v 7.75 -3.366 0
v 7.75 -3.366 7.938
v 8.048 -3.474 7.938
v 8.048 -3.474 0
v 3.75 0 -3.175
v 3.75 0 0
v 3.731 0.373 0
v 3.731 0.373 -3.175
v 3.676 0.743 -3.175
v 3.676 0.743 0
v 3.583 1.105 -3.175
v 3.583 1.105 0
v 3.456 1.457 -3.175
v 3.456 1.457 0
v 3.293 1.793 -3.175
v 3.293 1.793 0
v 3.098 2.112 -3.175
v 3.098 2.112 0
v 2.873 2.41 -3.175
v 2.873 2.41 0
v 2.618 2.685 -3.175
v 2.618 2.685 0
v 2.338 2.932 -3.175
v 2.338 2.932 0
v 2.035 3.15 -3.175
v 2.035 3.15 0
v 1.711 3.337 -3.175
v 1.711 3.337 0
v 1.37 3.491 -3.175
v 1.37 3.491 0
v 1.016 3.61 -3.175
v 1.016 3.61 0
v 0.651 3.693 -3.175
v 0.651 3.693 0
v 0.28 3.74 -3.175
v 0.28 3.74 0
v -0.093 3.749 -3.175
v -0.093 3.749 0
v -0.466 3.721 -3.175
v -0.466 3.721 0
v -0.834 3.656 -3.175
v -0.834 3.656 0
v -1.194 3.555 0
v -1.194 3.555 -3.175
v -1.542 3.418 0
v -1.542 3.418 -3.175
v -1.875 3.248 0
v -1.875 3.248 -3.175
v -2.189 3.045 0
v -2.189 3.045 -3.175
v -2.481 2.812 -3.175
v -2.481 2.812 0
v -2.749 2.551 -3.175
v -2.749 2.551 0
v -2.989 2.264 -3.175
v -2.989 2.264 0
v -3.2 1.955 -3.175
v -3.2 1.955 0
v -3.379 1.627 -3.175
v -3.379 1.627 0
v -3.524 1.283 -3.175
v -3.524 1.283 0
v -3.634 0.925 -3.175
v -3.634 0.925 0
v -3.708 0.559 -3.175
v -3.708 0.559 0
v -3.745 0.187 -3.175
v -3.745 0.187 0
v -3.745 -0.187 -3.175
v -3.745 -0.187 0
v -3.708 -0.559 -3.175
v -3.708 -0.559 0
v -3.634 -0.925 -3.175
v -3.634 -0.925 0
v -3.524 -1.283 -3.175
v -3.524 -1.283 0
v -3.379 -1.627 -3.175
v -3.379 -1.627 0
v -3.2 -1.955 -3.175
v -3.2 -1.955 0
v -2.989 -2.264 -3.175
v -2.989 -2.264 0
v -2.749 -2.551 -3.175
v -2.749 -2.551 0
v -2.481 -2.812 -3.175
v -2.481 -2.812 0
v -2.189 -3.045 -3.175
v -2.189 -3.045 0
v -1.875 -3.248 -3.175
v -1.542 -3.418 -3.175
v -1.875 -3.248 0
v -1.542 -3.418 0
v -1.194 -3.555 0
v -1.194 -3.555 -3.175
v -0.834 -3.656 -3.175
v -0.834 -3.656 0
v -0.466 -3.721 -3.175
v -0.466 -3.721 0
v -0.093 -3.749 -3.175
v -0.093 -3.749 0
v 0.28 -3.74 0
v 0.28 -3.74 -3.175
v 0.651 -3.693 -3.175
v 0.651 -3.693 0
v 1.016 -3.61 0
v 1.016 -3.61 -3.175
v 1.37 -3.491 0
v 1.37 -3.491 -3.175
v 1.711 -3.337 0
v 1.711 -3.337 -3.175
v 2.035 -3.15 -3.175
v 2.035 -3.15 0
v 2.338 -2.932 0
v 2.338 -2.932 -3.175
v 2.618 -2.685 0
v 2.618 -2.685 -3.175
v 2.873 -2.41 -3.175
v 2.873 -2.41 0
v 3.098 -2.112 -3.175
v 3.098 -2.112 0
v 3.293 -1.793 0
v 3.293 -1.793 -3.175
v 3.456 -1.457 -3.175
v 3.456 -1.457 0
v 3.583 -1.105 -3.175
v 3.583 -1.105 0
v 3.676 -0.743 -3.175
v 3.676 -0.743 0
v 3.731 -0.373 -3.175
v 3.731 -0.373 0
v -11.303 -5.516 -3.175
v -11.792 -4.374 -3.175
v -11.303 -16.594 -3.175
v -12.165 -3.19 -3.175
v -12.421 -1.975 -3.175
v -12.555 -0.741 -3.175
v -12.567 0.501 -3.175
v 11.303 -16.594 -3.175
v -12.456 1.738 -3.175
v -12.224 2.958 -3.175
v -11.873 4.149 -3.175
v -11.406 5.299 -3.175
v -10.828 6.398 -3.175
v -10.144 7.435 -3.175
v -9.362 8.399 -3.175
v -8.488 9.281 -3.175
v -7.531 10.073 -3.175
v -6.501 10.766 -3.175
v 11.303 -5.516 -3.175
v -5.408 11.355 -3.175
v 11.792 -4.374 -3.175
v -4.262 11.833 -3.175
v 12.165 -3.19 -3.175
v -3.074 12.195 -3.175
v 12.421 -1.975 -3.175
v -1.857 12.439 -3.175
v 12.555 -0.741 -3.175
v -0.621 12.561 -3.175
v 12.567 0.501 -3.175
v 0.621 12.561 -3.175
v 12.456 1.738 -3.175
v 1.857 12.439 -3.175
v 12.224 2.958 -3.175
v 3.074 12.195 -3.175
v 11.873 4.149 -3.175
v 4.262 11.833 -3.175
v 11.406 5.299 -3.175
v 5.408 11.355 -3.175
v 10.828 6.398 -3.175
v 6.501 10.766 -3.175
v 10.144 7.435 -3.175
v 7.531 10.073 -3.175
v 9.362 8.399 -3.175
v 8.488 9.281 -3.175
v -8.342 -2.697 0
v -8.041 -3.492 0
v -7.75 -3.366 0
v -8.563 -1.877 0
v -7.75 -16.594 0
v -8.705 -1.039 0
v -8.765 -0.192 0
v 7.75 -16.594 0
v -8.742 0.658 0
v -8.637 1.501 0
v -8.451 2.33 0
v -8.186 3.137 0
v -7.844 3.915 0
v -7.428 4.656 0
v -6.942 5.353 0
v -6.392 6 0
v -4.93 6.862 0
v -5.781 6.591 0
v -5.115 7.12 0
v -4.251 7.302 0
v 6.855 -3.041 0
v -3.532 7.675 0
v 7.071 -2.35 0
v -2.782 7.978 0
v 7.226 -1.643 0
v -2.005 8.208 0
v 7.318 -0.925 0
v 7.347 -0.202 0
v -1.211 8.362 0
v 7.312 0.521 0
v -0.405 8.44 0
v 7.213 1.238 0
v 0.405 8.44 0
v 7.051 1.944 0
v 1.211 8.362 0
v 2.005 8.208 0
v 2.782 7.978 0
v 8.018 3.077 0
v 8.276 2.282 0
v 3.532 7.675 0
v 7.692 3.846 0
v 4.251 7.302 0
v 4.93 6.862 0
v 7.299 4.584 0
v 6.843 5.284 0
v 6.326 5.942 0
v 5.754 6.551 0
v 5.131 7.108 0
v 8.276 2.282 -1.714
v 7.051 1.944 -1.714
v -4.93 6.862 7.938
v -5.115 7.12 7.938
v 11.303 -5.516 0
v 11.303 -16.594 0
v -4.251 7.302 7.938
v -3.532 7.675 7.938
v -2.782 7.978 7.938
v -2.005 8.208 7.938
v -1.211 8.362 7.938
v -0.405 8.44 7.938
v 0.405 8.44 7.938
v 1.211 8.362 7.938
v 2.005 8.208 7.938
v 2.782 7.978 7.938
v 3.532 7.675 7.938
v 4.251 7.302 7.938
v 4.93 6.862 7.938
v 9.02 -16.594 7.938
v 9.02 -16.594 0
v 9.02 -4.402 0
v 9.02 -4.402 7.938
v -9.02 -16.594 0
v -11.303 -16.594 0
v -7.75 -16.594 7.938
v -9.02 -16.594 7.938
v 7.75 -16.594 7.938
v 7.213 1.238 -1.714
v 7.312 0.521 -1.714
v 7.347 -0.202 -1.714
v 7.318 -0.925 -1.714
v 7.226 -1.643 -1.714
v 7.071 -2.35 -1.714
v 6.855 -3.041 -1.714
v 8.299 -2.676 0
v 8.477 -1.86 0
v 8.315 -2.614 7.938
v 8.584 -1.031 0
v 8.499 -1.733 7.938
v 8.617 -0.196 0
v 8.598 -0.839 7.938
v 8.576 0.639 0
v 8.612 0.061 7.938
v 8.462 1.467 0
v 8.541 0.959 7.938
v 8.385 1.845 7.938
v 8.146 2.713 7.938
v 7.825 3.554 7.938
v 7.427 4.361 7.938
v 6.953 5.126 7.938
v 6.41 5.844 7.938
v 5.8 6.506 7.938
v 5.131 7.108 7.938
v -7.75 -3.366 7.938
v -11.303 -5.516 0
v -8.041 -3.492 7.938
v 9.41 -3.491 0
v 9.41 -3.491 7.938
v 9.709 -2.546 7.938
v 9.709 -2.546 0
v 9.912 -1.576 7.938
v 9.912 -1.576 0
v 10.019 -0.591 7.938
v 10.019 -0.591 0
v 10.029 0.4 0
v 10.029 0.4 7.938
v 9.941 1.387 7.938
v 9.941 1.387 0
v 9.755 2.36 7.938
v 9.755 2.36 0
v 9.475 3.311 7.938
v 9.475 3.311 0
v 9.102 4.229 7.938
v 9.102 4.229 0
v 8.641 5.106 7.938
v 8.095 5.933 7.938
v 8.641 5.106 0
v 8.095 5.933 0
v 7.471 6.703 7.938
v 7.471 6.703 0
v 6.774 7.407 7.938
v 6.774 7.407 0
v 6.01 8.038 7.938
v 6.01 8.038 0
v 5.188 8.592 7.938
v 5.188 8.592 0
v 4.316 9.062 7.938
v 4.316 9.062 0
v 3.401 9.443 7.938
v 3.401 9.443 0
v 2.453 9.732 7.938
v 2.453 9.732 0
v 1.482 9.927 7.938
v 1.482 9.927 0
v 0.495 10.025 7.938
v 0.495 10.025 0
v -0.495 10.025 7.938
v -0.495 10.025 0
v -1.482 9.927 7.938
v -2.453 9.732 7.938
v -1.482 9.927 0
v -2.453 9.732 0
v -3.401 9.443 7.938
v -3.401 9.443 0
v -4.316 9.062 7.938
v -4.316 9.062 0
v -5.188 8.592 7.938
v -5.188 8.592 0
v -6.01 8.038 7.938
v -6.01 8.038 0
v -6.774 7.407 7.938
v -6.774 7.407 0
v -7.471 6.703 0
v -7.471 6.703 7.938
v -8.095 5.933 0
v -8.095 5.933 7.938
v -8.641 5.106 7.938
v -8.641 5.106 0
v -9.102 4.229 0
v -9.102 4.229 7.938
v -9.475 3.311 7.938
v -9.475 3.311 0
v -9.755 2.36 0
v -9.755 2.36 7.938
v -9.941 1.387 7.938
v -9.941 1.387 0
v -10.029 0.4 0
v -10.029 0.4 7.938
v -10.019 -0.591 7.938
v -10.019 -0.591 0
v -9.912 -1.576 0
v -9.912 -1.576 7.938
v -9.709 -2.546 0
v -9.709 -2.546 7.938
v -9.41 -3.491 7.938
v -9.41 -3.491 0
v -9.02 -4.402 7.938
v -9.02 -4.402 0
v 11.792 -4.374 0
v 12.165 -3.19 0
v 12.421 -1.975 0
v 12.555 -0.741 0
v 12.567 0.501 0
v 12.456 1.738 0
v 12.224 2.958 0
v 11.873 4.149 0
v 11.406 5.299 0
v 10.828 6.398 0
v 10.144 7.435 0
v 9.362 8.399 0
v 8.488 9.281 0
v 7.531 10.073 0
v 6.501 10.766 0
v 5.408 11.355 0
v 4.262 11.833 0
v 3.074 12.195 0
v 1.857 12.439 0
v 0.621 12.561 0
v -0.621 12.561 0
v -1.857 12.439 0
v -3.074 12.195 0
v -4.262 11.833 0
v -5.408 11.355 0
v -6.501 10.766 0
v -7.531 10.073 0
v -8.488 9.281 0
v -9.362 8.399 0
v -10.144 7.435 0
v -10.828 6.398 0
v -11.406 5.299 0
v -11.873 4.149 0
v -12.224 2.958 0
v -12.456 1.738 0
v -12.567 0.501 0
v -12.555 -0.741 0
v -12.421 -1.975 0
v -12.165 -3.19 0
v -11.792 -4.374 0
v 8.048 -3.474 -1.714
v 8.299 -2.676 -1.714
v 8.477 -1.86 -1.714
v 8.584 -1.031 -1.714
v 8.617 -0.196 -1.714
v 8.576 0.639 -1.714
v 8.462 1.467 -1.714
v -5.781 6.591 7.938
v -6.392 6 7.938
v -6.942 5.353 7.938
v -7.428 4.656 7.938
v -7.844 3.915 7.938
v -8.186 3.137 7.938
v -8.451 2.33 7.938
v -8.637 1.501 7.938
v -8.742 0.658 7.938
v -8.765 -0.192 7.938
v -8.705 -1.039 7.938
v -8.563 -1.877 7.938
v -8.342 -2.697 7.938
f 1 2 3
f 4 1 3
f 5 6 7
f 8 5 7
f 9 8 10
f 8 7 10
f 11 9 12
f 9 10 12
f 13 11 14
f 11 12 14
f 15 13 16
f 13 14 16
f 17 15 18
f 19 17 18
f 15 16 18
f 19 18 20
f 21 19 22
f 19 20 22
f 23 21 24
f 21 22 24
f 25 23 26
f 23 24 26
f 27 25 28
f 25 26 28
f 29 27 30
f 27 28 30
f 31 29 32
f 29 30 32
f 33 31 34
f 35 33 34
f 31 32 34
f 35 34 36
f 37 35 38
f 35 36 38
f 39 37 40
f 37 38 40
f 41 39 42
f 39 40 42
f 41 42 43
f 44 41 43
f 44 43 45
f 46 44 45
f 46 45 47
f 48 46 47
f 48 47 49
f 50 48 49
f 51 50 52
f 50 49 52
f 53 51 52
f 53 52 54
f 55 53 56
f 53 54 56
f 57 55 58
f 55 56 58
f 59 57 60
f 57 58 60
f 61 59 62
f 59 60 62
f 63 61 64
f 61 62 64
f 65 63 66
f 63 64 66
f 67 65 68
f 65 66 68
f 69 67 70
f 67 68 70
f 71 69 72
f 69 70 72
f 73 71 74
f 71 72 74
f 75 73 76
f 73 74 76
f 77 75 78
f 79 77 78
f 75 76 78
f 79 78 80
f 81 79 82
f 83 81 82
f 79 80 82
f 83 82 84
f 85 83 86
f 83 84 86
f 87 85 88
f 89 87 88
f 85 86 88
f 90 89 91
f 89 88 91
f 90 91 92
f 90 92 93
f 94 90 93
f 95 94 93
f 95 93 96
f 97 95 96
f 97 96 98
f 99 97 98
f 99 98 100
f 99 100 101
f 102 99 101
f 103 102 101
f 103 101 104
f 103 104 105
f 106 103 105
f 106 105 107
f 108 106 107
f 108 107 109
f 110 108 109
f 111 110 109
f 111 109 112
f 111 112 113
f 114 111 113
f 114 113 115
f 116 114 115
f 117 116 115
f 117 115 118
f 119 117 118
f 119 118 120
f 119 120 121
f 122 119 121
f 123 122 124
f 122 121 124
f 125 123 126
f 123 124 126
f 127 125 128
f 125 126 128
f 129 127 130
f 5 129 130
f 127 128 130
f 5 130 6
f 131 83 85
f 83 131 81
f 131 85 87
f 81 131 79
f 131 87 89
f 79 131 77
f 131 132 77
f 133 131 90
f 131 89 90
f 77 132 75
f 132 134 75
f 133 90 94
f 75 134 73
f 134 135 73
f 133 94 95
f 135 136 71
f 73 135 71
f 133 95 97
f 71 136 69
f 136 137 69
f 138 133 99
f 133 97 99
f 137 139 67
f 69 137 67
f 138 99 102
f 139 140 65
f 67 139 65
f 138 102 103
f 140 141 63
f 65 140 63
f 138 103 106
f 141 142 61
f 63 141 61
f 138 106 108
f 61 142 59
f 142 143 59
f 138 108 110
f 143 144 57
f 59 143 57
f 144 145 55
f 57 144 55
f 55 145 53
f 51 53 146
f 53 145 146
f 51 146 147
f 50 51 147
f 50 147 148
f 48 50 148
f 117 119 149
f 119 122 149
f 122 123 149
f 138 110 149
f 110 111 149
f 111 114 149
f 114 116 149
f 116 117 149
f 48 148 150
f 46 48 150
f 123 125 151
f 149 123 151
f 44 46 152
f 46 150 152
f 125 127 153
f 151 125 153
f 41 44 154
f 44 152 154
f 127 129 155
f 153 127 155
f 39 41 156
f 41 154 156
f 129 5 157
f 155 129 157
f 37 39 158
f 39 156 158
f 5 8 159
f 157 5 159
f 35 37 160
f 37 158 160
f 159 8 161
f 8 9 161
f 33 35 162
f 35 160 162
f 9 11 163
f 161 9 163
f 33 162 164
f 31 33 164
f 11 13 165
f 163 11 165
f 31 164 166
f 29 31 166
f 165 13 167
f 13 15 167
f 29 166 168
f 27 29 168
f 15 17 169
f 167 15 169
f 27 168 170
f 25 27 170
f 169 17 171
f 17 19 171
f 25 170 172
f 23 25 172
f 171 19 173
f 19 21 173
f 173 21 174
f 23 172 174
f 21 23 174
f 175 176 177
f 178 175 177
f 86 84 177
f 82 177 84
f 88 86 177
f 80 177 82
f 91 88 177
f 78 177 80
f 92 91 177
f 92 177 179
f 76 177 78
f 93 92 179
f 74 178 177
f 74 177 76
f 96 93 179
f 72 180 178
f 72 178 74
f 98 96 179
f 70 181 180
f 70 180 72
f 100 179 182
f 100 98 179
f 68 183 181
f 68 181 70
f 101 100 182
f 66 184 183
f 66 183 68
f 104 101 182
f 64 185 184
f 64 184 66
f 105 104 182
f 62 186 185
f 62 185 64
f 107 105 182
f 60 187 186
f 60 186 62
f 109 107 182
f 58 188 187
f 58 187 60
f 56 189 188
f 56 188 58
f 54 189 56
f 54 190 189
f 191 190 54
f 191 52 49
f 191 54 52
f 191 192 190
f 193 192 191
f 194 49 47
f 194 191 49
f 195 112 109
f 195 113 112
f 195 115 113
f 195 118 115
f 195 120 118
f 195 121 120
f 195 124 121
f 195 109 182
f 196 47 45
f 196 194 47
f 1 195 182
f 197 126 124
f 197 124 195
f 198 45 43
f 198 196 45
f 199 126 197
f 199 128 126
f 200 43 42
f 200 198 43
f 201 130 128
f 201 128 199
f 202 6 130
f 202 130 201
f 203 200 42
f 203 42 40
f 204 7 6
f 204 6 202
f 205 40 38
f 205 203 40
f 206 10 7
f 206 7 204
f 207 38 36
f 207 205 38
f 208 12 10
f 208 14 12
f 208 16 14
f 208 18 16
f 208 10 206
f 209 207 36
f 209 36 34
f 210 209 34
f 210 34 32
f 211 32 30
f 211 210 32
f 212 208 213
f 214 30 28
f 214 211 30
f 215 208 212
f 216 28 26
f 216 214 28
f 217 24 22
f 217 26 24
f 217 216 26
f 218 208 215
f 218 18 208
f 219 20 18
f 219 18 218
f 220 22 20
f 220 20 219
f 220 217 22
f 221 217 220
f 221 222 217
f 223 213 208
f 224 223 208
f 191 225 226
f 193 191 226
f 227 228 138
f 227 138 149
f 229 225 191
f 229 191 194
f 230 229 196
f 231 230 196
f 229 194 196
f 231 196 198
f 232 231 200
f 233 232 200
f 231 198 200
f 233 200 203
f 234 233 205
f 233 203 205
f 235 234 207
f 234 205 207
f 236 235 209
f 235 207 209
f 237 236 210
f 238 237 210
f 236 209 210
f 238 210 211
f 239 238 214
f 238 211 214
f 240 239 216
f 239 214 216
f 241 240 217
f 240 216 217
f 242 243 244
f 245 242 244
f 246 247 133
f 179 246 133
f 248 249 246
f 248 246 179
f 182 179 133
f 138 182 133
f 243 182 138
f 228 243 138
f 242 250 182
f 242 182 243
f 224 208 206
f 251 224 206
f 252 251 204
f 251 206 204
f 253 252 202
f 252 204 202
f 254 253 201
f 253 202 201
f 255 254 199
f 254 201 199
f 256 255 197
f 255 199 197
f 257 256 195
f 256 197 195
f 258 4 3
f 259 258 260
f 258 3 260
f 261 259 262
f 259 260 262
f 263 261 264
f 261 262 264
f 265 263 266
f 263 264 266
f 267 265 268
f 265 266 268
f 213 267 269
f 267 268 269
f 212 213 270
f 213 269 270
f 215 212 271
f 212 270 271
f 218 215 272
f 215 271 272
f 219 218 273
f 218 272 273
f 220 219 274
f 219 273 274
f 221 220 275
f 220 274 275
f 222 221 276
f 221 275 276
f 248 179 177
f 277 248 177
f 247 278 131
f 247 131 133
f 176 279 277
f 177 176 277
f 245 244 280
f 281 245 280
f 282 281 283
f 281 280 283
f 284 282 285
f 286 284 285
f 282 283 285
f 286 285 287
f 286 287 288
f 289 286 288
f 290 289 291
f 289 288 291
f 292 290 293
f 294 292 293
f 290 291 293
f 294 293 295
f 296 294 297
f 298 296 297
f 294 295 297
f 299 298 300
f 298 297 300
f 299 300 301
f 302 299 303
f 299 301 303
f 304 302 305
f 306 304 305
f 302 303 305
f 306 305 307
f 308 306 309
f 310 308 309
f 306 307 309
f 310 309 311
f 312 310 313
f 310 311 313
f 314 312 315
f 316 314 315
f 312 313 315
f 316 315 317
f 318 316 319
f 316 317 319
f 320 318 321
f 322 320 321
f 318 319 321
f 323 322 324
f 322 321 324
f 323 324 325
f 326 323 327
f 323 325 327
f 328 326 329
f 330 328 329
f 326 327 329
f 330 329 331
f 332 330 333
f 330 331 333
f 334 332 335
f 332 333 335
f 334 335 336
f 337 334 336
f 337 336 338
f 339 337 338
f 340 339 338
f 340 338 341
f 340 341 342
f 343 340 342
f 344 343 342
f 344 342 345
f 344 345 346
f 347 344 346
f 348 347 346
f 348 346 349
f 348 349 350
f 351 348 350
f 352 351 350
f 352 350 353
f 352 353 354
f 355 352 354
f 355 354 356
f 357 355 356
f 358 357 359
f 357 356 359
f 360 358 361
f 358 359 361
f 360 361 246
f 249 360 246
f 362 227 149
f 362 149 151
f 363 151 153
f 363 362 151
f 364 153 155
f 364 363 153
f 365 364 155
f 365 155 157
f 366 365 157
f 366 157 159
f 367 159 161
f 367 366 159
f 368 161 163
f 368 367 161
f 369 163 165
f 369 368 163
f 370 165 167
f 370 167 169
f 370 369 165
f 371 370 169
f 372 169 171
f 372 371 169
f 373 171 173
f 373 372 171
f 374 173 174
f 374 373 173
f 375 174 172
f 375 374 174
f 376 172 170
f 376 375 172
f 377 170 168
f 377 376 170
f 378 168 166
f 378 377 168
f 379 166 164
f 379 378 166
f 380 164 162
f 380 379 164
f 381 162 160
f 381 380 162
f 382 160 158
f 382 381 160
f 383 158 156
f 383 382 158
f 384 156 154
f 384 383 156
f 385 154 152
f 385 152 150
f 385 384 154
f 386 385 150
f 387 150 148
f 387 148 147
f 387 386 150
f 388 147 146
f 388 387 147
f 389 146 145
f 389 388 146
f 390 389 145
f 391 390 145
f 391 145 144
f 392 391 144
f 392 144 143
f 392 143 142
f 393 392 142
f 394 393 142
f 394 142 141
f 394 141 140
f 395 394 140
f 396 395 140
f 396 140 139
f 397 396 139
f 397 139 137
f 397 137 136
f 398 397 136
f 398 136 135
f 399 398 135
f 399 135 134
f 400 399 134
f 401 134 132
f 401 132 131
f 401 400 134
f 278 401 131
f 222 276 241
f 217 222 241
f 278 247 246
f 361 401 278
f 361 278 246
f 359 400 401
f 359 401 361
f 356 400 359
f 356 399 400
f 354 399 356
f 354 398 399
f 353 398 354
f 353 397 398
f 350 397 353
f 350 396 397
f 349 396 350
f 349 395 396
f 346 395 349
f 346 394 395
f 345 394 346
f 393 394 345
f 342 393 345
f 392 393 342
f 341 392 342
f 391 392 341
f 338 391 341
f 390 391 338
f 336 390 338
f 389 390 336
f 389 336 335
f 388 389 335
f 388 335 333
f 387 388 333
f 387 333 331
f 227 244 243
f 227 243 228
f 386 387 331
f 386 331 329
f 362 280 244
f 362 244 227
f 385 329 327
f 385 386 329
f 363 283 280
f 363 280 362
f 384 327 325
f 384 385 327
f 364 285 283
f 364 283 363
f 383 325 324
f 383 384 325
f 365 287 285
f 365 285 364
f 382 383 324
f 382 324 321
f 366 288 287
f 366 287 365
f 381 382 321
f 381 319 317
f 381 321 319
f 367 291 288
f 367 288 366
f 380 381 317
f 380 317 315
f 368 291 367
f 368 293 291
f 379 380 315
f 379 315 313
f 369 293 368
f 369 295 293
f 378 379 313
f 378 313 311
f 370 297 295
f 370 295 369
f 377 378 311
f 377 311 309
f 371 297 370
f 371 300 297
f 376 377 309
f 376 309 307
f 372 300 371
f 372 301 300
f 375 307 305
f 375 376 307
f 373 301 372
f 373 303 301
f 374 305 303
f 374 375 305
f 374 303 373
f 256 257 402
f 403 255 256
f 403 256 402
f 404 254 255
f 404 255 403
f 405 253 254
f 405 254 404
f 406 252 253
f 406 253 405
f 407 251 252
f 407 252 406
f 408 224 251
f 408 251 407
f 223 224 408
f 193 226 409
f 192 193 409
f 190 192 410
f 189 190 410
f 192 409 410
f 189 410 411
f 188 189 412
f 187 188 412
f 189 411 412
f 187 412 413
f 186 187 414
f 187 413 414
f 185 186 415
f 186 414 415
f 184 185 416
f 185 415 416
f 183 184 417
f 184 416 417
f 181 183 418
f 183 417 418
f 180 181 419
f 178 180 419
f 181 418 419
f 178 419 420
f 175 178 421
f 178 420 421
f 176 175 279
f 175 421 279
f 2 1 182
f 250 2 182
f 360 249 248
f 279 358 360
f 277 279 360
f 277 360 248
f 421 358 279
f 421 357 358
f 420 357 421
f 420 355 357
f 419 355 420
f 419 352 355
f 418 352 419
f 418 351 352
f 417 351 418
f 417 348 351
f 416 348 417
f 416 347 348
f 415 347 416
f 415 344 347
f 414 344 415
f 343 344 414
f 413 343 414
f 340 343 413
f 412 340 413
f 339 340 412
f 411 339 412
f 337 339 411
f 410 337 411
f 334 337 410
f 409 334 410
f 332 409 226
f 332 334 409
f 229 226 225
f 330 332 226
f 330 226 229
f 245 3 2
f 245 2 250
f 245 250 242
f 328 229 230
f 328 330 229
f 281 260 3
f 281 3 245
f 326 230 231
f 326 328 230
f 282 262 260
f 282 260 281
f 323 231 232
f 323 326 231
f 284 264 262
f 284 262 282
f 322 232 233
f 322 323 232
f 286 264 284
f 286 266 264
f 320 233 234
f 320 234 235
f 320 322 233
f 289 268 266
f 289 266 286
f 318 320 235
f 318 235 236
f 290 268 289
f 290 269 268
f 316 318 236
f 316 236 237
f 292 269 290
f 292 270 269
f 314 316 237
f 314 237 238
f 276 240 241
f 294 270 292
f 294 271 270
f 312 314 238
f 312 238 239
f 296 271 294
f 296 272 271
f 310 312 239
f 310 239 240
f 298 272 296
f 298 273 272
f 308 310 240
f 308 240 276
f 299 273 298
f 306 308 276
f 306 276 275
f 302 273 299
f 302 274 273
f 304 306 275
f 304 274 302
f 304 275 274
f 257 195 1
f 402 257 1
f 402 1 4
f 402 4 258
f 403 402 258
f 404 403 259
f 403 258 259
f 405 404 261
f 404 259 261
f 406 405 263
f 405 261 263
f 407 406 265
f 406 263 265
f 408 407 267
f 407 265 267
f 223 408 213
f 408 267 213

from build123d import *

# Parameters (mm, degrees)
SALIENTE_EXTRUIR1_DEPTH = 7.9375
CROQUIS4_R              = 3.75
SALIENTE_EXTRUIR5_DEPTH = 3.175
CORTAR_EXTRUIR2_DEPTH   = 7.9375
CORTAR_EXTRUIR1_DEPTH   = 1.7145


with BuildPart() as part:
    # Croquis1 → Saliente-Extruir1 (new body)
    with BuildSketch(Plane.XY):
        with BuildLine():
            Line((9.02, -8.199999983), (9.02, -4.401948997))
            ThreePointArc((9.02, -4.401948997), (0, 10.03681), (-9.02, -4.401948997))
            Line((-9.02, -4.401948997), (-9.02, -8.465948997))
            Line((-9.02, -8.465948997), (-9.02, -16.593948997))
            Line((-9.02, -16.593948997), (-7.75, -16.593948997))
            Line((-7.75, -16.593948997), (-7.75, -8.465948997))
            Line((-7.75, -8.465948997), (-7.75, -3.365759866))
            ThreePointArc((-7.75, -3.365759866), (0, 8.44931), (7.75, -3.365759866))
            Line((7.75, -3.365759866), (7.75, -8.199999983))
            Line((7.75, -8.199999983), (7.75, -16.593948997))
            Line((7.75, -16.593948997), (9.02, -16.593948997))
            Line((9.02, -16.593948997), (9.02, -8.199999983))
        make_face()
    extrude(amount=SALIENTE_EXTRUIR1_DEPTH)

    # Croquis4 → Saliente-Extruir5 (add)
    with BuildSketch(Plane.XY):
        with BuildLine():
            Line((-11.302677464, -5.515943429), (-11.302677464, -16.593948997))
            Line((-11.302677464, -16.593948997), (-9.02, -16.593948997))
            Line((-9.02, -16.593948997), (9.02, -16.593948997))
            Line((9.02, -16.593948997), (11.302677464, -16.593948997))
            Line((11.302677464, -16.593948997), (11.302677464, -5.515943429))
            ThreePointArc((11.302677464, -5.515943429), (0, 12.57681), (-11.302677464, -5.515943429))
        make_face()
        Circle(CROQUIS4_R, mode=Mode.SUBTRACT)
    extrude(amount=-SALIENTE_EXTRUIR5_DEPTH)

    # Croquis6 → Cortar-Extruir2 (cut)
    with BuildSketch(Plane.XY.offset(7.9375)):
        with BuildLine():
            Line((-8.041222005, -3.492235135), (-7.75, -3.365759866))
            ThreePointArc((-7.75, -3.365759866), (-8.145389049, 2.245768624), (-4.930152432, 6.86181))
            Line((-4.930152432, 6.86181), (-5.115412932, 7.11965646))
            ThreePointArc((-5.115412932, 7.11965646), (-8.451468602, 2.330157945), (-8.041222005, -3.492235135))
        make_face()
        with BuildLine():
            Line((7.75, -3.365759866), (8.048475458, -3.474012585))
            ThreePointArc((8.048475458, -3.474012585), (8.275668302, 2.281687971), (5.130979952, 7.107725752))
            Line((5.130979952, 7.107725752), (4.930152432, 6.86181))
            ThreePointArc((4.930152432, 6.86181), (7.96958875, 2.19729865), (7.75, -3.365759866))
        make_face()
    extrude(amount=-CORTAR_EXTRUIR2_DEPTH, mode=Mode.SUBTRACT)

    # Croquis5 → Cortar-Extruir1 (cut)
    with BuildSketch(Plane.XY):
        with BuildLine():
            Line((6.854573627, -3.041001708), (8.048475458, -3.474012585))
            ThreePointArc((8.048475458, -3.474012585), (8.609503442, -0.613823624), (8.275668302, 2.281687971))
            Line((8.275668302, 2.281687971), (7.051350093, 1.944130685))
            ThreePointArc((7.051350093, 1.944130685), (7.340491675, -0.563732346), (6.854573627, -3.041001708))
        make_face()
    extrude(amount=-CORTAR_EXTRUIR1_DEPTH, mode=Mode.SUBTRACT)


solid = part.part
